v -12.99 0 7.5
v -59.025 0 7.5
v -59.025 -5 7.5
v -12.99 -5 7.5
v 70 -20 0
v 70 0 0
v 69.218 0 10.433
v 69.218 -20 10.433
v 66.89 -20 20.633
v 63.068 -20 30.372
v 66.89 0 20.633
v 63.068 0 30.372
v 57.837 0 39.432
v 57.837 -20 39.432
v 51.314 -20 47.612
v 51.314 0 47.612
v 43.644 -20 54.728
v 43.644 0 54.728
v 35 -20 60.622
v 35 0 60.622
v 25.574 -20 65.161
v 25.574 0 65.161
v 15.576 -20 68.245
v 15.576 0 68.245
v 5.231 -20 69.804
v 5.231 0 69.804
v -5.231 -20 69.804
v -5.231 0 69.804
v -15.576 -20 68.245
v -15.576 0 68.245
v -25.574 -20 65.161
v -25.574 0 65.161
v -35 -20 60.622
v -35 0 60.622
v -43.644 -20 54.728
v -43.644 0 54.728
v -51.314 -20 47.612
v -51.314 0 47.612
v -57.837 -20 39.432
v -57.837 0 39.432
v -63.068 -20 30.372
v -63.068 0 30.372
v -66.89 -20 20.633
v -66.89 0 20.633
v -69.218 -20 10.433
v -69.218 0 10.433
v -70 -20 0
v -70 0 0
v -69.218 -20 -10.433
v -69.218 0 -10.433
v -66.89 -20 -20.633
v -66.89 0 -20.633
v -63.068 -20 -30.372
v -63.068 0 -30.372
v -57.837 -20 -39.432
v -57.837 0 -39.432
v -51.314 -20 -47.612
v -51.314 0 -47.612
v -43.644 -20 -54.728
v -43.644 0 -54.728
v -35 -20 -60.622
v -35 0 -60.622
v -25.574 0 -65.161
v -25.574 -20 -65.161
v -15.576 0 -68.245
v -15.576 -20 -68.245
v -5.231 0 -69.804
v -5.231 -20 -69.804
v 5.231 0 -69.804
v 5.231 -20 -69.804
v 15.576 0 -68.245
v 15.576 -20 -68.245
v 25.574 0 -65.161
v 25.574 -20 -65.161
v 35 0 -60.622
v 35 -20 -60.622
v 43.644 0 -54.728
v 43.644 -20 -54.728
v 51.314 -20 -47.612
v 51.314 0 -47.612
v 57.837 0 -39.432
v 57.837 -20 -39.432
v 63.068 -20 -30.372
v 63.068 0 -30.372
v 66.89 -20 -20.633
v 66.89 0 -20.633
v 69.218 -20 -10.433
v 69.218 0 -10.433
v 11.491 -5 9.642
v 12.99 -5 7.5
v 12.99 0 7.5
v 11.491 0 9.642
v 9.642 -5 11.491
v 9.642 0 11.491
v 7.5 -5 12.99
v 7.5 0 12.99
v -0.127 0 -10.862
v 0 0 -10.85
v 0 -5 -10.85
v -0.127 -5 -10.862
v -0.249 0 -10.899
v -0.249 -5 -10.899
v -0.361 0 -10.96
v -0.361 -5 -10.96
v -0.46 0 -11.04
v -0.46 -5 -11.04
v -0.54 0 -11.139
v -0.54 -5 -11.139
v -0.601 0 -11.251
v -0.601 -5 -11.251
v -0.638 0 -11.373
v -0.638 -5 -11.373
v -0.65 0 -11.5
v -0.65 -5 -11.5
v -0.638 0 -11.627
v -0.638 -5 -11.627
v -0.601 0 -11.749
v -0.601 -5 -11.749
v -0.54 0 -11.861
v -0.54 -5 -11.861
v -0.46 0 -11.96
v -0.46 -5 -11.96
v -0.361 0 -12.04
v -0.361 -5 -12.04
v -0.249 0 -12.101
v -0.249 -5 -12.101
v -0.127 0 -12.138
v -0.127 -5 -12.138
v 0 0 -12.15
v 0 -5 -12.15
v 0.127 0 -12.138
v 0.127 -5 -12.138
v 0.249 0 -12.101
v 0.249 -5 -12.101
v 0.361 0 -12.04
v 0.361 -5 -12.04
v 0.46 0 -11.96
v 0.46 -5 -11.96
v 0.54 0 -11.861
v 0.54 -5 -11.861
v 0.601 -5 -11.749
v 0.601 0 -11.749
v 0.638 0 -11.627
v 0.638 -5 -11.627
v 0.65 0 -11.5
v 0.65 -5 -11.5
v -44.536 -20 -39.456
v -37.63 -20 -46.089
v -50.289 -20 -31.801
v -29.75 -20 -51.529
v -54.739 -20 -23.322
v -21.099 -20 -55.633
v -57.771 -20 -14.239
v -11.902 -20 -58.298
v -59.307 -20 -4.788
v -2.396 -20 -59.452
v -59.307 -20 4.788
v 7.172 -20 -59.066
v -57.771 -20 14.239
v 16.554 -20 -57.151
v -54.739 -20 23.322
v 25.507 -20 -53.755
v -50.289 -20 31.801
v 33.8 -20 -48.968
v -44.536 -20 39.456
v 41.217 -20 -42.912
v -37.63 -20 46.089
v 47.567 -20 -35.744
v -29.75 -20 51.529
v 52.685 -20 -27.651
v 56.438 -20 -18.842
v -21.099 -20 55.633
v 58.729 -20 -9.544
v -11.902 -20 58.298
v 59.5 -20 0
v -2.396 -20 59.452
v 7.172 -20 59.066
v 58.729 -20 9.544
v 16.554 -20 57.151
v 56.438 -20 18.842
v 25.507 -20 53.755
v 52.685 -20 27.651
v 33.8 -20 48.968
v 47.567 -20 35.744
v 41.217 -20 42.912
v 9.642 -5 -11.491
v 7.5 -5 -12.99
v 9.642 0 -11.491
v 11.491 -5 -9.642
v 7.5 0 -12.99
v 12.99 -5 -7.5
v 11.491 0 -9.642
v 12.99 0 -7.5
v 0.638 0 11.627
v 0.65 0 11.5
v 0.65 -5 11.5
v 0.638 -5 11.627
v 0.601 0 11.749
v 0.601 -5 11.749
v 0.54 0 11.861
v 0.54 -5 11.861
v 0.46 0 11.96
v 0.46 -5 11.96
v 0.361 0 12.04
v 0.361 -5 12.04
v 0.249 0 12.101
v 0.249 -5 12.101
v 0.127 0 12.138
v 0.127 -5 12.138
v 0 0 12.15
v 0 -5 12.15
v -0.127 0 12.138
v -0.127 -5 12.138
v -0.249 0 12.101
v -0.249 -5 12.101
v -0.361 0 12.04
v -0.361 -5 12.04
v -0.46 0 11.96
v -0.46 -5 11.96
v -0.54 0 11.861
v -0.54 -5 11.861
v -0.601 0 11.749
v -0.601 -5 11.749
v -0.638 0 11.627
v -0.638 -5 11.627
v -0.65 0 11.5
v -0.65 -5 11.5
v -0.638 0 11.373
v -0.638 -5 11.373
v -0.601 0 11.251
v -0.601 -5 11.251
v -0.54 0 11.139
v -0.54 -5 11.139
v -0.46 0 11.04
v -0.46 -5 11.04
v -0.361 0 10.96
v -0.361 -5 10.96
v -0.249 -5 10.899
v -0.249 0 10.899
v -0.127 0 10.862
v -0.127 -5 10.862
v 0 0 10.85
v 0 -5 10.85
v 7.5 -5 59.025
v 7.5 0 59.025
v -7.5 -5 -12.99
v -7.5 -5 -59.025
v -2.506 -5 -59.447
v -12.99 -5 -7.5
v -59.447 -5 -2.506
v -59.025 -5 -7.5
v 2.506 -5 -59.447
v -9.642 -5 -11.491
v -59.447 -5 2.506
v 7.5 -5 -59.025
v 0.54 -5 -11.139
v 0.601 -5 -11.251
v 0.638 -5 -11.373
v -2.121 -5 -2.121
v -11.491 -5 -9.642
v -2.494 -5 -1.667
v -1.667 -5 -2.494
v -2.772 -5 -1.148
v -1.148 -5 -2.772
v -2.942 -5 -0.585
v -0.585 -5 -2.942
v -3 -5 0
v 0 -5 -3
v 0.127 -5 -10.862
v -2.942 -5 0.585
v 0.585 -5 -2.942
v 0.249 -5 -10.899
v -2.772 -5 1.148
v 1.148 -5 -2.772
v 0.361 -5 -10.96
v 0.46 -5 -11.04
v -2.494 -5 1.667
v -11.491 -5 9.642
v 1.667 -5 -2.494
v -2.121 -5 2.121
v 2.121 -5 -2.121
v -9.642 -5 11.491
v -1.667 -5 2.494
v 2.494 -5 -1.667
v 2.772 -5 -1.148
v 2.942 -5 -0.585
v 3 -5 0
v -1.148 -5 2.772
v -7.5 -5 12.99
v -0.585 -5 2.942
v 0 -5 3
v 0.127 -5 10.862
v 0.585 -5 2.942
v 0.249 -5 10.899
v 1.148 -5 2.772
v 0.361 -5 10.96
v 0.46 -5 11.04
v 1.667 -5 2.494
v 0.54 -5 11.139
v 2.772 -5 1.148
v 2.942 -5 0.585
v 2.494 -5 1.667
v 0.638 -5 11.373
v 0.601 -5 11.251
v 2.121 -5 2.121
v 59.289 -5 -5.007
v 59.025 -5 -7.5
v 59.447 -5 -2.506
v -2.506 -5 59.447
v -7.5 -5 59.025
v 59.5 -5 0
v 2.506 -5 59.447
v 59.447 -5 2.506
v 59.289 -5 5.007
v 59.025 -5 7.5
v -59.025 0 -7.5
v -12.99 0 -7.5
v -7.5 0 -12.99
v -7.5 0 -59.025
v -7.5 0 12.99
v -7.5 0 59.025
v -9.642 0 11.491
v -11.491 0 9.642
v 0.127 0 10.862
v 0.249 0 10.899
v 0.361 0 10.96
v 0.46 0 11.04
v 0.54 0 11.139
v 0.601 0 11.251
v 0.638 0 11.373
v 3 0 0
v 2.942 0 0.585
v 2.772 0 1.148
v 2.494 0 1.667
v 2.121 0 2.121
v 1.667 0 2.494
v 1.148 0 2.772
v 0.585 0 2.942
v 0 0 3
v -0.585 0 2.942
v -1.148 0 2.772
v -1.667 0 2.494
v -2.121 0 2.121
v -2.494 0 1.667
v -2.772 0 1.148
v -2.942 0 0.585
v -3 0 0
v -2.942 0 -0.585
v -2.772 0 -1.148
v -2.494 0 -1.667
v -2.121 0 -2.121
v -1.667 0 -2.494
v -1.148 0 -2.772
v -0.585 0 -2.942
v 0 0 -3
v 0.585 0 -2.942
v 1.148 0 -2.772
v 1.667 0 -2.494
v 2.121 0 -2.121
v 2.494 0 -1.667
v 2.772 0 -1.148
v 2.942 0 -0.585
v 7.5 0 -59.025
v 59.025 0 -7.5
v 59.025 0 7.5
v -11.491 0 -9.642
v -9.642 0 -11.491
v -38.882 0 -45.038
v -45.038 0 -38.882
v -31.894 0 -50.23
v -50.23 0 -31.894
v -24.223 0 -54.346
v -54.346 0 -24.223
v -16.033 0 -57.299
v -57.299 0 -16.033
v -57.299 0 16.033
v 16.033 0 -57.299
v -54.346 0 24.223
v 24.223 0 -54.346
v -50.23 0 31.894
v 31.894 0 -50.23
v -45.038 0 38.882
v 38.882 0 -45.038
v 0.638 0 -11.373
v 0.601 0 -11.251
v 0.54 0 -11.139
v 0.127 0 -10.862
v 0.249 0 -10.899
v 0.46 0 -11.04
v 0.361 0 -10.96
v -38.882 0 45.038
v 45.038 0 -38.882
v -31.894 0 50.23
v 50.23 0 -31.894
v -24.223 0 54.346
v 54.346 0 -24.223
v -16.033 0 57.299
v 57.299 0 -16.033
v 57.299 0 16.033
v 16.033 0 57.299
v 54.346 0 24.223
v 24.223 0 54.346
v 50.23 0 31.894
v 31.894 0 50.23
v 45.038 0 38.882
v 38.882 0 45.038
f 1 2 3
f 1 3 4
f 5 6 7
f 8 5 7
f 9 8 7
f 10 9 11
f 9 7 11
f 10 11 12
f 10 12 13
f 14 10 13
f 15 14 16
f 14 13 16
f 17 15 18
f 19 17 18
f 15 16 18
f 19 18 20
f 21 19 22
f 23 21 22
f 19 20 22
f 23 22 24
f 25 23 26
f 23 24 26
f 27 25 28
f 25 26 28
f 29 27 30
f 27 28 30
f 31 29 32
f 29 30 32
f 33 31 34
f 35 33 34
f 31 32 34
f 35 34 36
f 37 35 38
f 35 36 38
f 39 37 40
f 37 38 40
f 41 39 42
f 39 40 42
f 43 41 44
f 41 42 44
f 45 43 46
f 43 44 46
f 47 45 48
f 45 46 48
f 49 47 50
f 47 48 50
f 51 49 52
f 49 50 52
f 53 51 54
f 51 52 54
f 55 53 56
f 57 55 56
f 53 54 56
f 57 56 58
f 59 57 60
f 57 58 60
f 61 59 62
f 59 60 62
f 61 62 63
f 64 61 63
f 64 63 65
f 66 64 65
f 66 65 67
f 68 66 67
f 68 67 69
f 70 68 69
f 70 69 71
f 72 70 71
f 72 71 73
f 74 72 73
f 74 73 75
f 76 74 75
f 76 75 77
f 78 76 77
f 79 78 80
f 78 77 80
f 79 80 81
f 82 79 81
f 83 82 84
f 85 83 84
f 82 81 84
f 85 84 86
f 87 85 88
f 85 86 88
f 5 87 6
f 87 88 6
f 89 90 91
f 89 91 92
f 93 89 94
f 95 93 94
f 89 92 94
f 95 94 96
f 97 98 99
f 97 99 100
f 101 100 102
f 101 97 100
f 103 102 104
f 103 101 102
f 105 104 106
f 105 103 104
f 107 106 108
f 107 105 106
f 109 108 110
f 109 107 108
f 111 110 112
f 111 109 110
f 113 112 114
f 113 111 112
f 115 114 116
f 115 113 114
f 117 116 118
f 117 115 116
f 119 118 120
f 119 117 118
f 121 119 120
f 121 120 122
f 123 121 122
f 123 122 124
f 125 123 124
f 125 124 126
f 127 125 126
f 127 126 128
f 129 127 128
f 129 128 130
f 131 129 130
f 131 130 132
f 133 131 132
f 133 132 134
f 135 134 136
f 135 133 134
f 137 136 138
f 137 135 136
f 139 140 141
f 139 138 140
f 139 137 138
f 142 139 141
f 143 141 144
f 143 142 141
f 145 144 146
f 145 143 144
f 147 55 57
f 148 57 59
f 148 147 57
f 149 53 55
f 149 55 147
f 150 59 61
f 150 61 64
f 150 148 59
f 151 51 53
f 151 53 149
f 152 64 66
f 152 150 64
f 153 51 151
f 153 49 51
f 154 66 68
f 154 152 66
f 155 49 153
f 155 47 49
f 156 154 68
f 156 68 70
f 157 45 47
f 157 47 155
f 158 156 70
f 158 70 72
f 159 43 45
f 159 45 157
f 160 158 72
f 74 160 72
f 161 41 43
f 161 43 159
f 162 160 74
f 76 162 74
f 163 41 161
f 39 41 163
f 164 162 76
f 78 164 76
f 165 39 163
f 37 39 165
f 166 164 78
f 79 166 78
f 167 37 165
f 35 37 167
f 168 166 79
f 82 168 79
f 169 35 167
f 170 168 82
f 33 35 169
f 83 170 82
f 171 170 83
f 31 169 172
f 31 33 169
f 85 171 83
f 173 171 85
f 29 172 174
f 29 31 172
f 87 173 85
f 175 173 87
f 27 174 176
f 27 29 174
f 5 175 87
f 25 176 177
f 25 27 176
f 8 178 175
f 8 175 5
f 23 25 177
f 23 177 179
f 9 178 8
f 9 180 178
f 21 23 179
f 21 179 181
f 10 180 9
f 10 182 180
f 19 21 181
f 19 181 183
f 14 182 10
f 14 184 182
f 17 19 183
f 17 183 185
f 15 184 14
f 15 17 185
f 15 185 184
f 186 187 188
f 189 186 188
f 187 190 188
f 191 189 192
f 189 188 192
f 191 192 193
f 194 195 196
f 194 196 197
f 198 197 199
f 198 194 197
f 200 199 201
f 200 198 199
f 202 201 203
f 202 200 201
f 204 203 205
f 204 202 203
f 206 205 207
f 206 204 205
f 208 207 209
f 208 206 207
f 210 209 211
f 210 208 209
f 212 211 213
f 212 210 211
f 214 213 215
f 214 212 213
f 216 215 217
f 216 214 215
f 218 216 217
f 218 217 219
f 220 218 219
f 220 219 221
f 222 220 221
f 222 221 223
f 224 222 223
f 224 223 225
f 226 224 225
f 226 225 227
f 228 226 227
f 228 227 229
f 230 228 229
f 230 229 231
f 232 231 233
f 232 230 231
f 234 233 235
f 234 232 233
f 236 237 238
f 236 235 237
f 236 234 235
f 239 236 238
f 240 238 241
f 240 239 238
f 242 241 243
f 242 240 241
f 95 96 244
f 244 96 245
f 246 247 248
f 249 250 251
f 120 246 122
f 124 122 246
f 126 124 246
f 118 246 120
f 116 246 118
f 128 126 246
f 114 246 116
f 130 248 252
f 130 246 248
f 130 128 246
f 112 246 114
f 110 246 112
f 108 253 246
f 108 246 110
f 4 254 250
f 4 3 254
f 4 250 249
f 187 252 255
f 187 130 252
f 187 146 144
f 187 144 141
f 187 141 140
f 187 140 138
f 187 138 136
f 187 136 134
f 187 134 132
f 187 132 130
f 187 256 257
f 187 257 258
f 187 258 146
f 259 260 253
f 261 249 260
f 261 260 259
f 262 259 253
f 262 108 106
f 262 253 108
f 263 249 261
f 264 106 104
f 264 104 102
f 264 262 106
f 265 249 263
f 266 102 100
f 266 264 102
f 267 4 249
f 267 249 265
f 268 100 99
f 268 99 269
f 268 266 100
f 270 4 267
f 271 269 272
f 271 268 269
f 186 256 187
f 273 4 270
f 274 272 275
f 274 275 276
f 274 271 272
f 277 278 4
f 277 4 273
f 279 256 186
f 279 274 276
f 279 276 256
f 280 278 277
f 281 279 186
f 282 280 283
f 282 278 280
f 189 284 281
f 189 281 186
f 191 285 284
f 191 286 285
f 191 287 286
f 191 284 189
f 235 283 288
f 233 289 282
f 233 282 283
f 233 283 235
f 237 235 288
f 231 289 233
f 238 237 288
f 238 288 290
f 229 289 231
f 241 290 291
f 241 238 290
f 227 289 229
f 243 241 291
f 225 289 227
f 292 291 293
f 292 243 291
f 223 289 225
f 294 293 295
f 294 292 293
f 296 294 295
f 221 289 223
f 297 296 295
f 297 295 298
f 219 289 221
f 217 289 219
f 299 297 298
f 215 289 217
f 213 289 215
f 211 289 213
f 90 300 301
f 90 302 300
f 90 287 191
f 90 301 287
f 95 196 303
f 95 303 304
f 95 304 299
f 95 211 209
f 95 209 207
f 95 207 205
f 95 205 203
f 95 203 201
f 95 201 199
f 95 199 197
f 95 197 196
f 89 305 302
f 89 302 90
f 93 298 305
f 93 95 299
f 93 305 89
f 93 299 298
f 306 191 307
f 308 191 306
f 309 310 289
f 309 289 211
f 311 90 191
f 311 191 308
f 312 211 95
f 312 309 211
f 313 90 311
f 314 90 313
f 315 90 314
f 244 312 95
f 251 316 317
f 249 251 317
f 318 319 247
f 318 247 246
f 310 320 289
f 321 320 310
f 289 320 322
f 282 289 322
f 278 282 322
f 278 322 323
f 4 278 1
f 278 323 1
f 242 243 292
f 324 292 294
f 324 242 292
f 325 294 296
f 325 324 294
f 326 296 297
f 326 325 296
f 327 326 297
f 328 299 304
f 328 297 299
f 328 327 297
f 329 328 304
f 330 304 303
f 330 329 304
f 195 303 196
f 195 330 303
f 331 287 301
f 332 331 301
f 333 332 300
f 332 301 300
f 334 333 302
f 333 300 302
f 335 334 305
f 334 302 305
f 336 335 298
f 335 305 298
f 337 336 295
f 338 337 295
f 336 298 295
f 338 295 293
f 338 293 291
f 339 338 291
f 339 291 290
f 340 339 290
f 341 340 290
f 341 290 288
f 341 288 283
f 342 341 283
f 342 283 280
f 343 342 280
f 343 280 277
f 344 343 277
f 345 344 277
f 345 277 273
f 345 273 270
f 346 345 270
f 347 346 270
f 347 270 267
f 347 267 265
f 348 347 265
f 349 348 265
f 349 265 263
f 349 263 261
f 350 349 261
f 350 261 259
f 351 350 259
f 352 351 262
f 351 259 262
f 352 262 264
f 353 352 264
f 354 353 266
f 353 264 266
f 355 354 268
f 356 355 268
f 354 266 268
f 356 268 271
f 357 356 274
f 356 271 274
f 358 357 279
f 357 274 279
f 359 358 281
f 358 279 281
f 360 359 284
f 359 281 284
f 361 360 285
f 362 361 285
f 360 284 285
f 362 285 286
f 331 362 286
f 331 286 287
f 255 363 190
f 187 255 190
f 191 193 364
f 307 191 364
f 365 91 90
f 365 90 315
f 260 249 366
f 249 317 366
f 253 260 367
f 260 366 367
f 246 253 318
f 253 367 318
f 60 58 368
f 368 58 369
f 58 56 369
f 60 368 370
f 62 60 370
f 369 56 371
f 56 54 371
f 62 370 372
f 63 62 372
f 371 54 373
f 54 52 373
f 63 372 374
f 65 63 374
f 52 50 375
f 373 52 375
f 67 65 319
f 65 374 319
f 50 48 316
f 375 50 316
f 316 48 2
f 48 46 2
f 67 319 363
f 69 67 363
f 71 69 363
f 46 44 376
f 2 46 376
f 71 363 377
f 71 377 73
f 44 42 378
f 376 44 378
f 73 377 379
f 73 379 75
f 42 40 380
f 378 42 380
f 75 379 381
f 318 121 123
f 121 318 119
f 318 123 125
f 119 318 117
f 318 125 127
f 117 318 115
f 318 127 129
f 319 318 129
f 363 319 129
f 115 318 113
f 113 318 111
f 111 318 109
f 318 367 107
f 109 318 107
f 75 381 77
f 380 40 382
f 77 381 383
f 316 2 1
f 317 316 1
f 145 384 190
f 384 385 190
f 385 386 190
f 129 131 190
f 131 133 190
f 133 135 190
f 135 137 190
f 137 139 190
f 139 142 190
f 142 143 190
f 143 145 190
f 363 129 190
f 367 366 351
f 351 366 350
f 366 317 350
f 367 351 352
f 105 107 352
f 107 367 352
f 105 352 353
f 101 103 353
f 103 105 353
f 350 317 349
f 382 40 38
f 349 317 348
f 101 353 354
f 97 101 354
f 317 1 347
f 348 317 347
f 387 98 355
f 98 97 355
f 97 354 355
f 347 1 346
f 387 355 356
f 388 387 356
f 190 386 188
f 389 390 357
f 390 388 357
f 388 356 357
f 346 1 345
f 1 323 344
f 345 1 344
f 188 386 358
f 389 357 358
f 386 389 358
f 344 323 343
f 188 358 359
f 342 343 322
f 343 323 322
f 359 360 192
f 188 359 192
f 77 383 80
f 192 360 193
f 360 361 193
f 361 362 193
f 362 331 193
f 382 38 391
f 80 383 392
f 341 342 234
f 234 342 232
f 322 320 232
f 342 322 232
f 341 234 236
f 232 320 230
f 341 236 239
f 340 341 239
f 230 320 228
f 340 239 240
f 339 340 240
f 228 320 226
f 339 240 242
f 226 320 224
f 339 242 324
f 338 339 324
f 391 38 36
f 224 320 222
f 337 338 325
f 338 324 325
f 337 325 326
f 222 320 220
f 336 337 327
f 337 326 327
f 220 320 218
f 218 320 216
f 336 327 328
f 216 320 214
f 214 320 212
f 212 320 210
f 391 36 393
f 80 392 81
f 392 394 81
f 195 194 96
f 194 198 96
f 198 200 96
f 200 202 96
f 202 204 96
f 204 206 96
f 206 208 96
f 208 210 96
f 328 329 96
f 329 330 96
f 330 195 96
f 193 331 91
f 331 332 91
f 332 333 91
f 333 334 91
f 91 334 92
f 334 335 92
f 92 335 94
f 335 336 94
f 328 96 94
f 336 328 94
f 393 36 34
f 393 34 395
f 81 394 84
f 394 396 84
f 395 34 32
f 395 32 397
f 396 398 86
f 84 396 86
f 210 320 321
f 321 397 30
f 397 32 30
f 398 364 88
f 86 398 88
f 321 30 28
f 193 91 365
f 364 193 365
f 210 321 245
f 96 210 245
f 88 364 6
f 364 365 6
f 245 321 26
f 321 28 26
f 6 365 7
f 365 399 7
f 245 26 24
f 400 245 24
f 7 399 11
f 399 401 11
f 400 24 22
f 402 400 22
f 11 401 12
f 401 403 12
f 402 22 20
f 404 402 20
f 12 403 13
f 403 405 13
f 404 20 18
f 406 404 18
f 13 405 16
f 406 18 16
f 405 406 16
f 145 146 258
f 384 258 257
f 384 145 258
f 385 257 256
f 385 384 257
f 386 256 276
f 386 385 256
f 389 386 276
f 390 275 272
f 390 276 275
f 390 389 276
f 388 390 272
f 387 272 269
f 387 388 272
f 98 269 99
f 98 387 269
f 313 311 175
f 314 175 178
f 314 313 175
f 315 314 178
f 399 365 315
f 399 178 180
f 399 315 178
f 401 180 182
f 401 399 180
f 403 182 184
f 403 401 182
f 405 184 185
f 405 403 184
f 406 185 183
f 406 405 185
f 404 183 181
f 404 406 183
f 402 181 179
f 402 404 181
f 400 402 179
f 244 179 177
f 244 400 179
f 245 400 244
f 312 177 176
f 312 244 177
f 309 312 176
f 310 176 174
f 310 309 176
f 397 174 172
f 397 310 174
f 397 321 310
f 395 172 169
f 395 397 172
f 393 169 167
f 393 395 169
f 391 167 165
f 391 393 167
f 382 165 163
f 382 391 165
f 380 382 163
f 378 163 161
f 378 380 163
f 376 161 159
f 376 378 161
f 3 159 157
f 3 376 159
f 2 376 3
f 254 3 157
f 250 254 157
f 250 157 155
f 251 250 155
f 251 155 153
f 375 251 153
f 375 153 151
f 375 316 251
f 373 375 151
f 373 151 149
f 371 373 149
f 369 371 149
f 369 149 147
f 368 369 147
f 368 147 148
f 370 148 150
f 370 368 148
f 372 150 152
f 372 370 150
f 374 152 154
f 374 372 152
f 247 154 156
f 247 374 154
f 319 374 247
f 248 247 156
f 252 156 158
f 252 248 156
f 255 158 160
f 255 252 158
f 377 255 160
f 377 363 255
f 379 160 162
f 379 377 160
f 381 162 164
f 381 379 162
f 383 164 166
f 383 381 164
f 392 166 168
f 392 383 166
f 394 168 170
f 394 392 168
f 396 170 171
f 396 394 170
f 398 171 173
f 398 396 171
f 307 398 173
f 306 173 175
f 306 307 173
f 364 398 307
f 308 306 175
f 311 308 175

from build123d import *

# Parameters (mm, degrees)
F2_R      = 70
F2_R_2    = 59.5
F3_DEPTH  = 20
F4_R      = 15
F5_DEPTH  = 5
F6_W      = 130
F6_H      = 15
F7_DEPTH  = 5
F8_W      = 15
F8_H      = 130
F9_DEPTH  = 5
F11_R     = 3
F12_DEPTH = 5.001
F14_DEPTH = 25


with BuildPart() as f3:
    # F2 (on Front) → F3 (new body)
    with BuildSketch(Plane.XZ):
        Circle(F2_R)
        Circle(F2_R_2, mode=Mode.SUBTRACT)
    extrude(amount=F3_DEPTH)


with BuildPart() as f5:
    # F4 (on Front) → F5 (new body)
    with BuildSketch(Plane.XZ):
        Circle(F4_R)
    extrude(amount=F5_DEPTH)


with BuildPart() as f7:
    # F6 (on Front) → F7 (new body)
    with BuildSketch(Plane.XZ):
        Rectangle(F6_W, F6_H)
    extrude(amount=F7_DEPTH)


with BuildPart() as f9:
    # F8 (on Front) → F9 (new body)
    with BuildSketch(Plane.XZ):
        Rectangle(F8_W, F8_H)
    extrude(amount=F9_DEPTH)


with BuildPart() as f3_1:
    add(f3.part)

    # F10: union F5, F7, F9
    add(f5.part)
    add(f7.part)
    add(f9.part)

    # F11 (on face) → F12 (cut, through all)
    with BuildSketch(Plane.XZ.offset(5)):
        Circle(F11_R)
    extrude(amount=-F12_DEPTH, mode=Mode.SUBTRACT)

    # F13 (on Front) → F14 (cut)
    with BuildSketch(Plane.XZ):
        with BuildLine():
            ThreePointArc((0.65, -11.5), (0.4596194078, -11.0403805922), (0, -10.85))
            ThreePointArc((0, -10.85), (-0.4596194078, -11.9596194078), (0.65, -11.5))
        make_face()
        with BuildLine():
            ThreePointArc((0.65, 11.5), (-0.4596194078, 11.9596194078), (0, 10.85))
            ThreePointArc((0, 10.85), (0.4596194078, 11.0403805922), (0.65, 11.5))
        make_face()
    extrude(amount=F14_DEPTH, mode=Mode.SUBTRACT)


solid = f3_1.part
